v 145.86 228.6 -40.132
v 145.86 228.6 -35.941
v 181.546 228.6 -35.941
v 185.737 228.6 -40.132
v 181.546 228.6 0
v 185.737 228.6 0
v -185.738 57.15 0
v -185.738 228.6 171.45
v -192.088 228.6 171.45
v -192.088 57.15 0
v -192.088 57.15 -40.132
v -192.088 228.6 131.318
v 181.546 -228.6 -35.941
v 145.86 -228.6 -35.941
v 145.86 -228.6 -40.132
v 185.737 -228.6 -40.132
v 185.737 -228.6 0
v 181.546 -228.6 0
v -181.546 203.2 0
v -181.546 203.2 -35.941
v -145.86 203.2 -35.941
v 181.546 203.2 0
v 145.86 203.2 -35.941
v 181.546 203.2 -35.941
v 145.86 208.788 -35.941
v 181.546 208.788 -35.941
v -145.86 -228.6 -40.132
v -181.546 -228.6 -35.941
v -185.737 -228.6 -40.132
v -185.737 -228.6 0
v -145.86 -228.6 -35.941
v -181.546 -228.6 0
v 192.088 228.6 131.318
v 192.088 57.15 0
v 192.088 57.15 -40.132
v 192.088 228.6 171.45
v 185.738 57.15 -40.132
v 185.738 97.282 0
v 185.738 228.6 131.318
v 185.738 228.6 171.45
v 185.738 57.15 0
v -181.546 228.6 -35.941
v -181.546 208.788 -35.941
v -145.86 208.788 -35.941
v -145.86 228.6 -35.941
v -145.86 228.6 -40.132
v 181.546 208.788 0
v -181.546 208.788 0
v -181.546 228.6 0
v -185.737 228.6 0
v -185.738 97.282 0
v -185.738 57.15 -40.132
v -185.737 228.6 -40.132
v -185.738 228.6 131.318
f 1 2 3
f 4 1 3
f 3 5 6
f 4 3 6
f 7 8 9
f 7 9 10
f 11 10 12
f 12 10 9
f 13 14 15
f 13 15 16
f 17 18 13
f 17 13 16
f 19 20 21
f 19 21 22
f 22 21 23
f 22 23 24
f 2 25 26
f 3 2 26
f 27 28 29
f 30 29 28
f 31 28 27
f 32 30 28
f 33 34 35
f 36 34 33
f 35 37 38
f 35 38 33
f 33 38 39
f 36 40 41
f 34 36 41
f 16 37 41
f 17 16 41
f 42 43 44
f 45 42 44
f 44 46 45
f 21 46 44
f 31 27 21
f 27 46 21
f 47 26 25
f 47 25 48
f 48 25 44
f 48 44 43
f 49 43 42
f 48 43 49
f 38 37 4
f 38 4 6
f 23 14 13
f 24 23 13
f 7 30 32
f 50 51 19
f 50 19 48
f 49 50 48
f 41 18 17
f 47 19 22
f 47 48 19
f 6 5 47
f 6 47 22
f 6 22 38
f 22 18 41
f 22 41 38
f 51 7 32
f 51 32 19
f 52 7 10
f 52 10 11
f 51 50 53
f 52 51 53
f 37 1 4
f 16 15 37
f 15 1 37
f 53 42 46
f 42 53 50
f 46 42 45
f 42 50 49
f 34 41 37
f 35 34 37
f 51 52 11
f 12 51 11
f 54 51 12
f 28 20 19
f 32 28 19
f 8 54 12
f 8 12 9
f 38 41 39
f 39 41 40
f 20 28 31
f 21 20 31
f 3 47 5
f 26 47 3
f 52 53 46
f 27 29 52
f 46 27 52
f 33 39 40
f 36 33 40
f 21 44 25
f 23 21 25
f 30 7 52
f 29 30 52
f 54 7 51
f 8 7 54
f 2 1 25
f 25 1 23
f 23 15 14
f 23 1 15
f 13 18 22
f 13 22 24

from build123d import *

# Parameters (mm, degrees)
F0_W     = 4.191
F0_H     = 35.941
F0_W_2   = 35.687
F0_H_2   = 4.191
F1_DEPTH = 228.6
F2_W     = 35.687
F2_H     = 5.588
F2_W_2   = 291.719
F3_DEPTH = 35.941
F5_DEPTH = 6.35


with BuildPart() as f1:
    # F0 (on Front) → F1 (new body, symmetric)
    with BuildSketch(Plane.XZ):
        with Locations((-183.642, -17.9705)):
            Rectangle(F0_W, F0_H)
        with Locations((-163.703, -38.0365)):
            Rectangle(F0_W_2, F0_H_2)
        with Locations((-183.642, -38.0365)):
            Rectangle(F0_W, F0_H_2)
    extrude(amount=F1_DEPTH, both=True)



with BuildPart() as f1b:
    # F0 (on Front) → F1, piece 2 (new body, symmetric)
    with BuildSketch(Plane.XZ):
        with Locations((183.642, -17.9705)):
            Rectangle(F0_W, F0_H)
        with Locations((183.642, -38.0365)):
            Rectangle(F0_W, F0_H_2)
        with Locations((163.703, -38.0365)):
            Rectangle(F0_W_2, F0_H_2)
    extrude(amount=F1_DEPTH, both=True)


with BuildPart() as f1_1:
    add(f1.part)

    add(f1b.part)  # F3 merges F1b
    # F2 (on face) → F3 (join)
    with BuildSketch(Plane.XY.offset(-35.941)):
        with Locations((-163.703, 205.994)):
            Rectangle(F2_W, F2_H)
        with Locations((0, 205.994)):
            Rectangle(F2_W_2, F2_H)
        with Locations((163.703, 205.994)):
            Rectangle(F2_W, F2_H)
    extrude(amount=F3_DEPTH)

    # F4 (on face) → F5 (join)
    with BuildSketch(Plane.YZ.offset(185.7375)):
        Polygon((228.6, 171.45), (57.15, 0), (97.282, 0), (228.6, 131.318), align=None)
        Polygon((97.282, 0), (57.15, 0), (57.15, -40.132), align=None)
    extrude(amount=F5_DEPTH)

    # F6: F1 across plane


with BuildPart() as f1_2:
    add(f1_1.part)
    add(f1_1.part.mirror(Plane.YZ))


solid = f1_2.part
